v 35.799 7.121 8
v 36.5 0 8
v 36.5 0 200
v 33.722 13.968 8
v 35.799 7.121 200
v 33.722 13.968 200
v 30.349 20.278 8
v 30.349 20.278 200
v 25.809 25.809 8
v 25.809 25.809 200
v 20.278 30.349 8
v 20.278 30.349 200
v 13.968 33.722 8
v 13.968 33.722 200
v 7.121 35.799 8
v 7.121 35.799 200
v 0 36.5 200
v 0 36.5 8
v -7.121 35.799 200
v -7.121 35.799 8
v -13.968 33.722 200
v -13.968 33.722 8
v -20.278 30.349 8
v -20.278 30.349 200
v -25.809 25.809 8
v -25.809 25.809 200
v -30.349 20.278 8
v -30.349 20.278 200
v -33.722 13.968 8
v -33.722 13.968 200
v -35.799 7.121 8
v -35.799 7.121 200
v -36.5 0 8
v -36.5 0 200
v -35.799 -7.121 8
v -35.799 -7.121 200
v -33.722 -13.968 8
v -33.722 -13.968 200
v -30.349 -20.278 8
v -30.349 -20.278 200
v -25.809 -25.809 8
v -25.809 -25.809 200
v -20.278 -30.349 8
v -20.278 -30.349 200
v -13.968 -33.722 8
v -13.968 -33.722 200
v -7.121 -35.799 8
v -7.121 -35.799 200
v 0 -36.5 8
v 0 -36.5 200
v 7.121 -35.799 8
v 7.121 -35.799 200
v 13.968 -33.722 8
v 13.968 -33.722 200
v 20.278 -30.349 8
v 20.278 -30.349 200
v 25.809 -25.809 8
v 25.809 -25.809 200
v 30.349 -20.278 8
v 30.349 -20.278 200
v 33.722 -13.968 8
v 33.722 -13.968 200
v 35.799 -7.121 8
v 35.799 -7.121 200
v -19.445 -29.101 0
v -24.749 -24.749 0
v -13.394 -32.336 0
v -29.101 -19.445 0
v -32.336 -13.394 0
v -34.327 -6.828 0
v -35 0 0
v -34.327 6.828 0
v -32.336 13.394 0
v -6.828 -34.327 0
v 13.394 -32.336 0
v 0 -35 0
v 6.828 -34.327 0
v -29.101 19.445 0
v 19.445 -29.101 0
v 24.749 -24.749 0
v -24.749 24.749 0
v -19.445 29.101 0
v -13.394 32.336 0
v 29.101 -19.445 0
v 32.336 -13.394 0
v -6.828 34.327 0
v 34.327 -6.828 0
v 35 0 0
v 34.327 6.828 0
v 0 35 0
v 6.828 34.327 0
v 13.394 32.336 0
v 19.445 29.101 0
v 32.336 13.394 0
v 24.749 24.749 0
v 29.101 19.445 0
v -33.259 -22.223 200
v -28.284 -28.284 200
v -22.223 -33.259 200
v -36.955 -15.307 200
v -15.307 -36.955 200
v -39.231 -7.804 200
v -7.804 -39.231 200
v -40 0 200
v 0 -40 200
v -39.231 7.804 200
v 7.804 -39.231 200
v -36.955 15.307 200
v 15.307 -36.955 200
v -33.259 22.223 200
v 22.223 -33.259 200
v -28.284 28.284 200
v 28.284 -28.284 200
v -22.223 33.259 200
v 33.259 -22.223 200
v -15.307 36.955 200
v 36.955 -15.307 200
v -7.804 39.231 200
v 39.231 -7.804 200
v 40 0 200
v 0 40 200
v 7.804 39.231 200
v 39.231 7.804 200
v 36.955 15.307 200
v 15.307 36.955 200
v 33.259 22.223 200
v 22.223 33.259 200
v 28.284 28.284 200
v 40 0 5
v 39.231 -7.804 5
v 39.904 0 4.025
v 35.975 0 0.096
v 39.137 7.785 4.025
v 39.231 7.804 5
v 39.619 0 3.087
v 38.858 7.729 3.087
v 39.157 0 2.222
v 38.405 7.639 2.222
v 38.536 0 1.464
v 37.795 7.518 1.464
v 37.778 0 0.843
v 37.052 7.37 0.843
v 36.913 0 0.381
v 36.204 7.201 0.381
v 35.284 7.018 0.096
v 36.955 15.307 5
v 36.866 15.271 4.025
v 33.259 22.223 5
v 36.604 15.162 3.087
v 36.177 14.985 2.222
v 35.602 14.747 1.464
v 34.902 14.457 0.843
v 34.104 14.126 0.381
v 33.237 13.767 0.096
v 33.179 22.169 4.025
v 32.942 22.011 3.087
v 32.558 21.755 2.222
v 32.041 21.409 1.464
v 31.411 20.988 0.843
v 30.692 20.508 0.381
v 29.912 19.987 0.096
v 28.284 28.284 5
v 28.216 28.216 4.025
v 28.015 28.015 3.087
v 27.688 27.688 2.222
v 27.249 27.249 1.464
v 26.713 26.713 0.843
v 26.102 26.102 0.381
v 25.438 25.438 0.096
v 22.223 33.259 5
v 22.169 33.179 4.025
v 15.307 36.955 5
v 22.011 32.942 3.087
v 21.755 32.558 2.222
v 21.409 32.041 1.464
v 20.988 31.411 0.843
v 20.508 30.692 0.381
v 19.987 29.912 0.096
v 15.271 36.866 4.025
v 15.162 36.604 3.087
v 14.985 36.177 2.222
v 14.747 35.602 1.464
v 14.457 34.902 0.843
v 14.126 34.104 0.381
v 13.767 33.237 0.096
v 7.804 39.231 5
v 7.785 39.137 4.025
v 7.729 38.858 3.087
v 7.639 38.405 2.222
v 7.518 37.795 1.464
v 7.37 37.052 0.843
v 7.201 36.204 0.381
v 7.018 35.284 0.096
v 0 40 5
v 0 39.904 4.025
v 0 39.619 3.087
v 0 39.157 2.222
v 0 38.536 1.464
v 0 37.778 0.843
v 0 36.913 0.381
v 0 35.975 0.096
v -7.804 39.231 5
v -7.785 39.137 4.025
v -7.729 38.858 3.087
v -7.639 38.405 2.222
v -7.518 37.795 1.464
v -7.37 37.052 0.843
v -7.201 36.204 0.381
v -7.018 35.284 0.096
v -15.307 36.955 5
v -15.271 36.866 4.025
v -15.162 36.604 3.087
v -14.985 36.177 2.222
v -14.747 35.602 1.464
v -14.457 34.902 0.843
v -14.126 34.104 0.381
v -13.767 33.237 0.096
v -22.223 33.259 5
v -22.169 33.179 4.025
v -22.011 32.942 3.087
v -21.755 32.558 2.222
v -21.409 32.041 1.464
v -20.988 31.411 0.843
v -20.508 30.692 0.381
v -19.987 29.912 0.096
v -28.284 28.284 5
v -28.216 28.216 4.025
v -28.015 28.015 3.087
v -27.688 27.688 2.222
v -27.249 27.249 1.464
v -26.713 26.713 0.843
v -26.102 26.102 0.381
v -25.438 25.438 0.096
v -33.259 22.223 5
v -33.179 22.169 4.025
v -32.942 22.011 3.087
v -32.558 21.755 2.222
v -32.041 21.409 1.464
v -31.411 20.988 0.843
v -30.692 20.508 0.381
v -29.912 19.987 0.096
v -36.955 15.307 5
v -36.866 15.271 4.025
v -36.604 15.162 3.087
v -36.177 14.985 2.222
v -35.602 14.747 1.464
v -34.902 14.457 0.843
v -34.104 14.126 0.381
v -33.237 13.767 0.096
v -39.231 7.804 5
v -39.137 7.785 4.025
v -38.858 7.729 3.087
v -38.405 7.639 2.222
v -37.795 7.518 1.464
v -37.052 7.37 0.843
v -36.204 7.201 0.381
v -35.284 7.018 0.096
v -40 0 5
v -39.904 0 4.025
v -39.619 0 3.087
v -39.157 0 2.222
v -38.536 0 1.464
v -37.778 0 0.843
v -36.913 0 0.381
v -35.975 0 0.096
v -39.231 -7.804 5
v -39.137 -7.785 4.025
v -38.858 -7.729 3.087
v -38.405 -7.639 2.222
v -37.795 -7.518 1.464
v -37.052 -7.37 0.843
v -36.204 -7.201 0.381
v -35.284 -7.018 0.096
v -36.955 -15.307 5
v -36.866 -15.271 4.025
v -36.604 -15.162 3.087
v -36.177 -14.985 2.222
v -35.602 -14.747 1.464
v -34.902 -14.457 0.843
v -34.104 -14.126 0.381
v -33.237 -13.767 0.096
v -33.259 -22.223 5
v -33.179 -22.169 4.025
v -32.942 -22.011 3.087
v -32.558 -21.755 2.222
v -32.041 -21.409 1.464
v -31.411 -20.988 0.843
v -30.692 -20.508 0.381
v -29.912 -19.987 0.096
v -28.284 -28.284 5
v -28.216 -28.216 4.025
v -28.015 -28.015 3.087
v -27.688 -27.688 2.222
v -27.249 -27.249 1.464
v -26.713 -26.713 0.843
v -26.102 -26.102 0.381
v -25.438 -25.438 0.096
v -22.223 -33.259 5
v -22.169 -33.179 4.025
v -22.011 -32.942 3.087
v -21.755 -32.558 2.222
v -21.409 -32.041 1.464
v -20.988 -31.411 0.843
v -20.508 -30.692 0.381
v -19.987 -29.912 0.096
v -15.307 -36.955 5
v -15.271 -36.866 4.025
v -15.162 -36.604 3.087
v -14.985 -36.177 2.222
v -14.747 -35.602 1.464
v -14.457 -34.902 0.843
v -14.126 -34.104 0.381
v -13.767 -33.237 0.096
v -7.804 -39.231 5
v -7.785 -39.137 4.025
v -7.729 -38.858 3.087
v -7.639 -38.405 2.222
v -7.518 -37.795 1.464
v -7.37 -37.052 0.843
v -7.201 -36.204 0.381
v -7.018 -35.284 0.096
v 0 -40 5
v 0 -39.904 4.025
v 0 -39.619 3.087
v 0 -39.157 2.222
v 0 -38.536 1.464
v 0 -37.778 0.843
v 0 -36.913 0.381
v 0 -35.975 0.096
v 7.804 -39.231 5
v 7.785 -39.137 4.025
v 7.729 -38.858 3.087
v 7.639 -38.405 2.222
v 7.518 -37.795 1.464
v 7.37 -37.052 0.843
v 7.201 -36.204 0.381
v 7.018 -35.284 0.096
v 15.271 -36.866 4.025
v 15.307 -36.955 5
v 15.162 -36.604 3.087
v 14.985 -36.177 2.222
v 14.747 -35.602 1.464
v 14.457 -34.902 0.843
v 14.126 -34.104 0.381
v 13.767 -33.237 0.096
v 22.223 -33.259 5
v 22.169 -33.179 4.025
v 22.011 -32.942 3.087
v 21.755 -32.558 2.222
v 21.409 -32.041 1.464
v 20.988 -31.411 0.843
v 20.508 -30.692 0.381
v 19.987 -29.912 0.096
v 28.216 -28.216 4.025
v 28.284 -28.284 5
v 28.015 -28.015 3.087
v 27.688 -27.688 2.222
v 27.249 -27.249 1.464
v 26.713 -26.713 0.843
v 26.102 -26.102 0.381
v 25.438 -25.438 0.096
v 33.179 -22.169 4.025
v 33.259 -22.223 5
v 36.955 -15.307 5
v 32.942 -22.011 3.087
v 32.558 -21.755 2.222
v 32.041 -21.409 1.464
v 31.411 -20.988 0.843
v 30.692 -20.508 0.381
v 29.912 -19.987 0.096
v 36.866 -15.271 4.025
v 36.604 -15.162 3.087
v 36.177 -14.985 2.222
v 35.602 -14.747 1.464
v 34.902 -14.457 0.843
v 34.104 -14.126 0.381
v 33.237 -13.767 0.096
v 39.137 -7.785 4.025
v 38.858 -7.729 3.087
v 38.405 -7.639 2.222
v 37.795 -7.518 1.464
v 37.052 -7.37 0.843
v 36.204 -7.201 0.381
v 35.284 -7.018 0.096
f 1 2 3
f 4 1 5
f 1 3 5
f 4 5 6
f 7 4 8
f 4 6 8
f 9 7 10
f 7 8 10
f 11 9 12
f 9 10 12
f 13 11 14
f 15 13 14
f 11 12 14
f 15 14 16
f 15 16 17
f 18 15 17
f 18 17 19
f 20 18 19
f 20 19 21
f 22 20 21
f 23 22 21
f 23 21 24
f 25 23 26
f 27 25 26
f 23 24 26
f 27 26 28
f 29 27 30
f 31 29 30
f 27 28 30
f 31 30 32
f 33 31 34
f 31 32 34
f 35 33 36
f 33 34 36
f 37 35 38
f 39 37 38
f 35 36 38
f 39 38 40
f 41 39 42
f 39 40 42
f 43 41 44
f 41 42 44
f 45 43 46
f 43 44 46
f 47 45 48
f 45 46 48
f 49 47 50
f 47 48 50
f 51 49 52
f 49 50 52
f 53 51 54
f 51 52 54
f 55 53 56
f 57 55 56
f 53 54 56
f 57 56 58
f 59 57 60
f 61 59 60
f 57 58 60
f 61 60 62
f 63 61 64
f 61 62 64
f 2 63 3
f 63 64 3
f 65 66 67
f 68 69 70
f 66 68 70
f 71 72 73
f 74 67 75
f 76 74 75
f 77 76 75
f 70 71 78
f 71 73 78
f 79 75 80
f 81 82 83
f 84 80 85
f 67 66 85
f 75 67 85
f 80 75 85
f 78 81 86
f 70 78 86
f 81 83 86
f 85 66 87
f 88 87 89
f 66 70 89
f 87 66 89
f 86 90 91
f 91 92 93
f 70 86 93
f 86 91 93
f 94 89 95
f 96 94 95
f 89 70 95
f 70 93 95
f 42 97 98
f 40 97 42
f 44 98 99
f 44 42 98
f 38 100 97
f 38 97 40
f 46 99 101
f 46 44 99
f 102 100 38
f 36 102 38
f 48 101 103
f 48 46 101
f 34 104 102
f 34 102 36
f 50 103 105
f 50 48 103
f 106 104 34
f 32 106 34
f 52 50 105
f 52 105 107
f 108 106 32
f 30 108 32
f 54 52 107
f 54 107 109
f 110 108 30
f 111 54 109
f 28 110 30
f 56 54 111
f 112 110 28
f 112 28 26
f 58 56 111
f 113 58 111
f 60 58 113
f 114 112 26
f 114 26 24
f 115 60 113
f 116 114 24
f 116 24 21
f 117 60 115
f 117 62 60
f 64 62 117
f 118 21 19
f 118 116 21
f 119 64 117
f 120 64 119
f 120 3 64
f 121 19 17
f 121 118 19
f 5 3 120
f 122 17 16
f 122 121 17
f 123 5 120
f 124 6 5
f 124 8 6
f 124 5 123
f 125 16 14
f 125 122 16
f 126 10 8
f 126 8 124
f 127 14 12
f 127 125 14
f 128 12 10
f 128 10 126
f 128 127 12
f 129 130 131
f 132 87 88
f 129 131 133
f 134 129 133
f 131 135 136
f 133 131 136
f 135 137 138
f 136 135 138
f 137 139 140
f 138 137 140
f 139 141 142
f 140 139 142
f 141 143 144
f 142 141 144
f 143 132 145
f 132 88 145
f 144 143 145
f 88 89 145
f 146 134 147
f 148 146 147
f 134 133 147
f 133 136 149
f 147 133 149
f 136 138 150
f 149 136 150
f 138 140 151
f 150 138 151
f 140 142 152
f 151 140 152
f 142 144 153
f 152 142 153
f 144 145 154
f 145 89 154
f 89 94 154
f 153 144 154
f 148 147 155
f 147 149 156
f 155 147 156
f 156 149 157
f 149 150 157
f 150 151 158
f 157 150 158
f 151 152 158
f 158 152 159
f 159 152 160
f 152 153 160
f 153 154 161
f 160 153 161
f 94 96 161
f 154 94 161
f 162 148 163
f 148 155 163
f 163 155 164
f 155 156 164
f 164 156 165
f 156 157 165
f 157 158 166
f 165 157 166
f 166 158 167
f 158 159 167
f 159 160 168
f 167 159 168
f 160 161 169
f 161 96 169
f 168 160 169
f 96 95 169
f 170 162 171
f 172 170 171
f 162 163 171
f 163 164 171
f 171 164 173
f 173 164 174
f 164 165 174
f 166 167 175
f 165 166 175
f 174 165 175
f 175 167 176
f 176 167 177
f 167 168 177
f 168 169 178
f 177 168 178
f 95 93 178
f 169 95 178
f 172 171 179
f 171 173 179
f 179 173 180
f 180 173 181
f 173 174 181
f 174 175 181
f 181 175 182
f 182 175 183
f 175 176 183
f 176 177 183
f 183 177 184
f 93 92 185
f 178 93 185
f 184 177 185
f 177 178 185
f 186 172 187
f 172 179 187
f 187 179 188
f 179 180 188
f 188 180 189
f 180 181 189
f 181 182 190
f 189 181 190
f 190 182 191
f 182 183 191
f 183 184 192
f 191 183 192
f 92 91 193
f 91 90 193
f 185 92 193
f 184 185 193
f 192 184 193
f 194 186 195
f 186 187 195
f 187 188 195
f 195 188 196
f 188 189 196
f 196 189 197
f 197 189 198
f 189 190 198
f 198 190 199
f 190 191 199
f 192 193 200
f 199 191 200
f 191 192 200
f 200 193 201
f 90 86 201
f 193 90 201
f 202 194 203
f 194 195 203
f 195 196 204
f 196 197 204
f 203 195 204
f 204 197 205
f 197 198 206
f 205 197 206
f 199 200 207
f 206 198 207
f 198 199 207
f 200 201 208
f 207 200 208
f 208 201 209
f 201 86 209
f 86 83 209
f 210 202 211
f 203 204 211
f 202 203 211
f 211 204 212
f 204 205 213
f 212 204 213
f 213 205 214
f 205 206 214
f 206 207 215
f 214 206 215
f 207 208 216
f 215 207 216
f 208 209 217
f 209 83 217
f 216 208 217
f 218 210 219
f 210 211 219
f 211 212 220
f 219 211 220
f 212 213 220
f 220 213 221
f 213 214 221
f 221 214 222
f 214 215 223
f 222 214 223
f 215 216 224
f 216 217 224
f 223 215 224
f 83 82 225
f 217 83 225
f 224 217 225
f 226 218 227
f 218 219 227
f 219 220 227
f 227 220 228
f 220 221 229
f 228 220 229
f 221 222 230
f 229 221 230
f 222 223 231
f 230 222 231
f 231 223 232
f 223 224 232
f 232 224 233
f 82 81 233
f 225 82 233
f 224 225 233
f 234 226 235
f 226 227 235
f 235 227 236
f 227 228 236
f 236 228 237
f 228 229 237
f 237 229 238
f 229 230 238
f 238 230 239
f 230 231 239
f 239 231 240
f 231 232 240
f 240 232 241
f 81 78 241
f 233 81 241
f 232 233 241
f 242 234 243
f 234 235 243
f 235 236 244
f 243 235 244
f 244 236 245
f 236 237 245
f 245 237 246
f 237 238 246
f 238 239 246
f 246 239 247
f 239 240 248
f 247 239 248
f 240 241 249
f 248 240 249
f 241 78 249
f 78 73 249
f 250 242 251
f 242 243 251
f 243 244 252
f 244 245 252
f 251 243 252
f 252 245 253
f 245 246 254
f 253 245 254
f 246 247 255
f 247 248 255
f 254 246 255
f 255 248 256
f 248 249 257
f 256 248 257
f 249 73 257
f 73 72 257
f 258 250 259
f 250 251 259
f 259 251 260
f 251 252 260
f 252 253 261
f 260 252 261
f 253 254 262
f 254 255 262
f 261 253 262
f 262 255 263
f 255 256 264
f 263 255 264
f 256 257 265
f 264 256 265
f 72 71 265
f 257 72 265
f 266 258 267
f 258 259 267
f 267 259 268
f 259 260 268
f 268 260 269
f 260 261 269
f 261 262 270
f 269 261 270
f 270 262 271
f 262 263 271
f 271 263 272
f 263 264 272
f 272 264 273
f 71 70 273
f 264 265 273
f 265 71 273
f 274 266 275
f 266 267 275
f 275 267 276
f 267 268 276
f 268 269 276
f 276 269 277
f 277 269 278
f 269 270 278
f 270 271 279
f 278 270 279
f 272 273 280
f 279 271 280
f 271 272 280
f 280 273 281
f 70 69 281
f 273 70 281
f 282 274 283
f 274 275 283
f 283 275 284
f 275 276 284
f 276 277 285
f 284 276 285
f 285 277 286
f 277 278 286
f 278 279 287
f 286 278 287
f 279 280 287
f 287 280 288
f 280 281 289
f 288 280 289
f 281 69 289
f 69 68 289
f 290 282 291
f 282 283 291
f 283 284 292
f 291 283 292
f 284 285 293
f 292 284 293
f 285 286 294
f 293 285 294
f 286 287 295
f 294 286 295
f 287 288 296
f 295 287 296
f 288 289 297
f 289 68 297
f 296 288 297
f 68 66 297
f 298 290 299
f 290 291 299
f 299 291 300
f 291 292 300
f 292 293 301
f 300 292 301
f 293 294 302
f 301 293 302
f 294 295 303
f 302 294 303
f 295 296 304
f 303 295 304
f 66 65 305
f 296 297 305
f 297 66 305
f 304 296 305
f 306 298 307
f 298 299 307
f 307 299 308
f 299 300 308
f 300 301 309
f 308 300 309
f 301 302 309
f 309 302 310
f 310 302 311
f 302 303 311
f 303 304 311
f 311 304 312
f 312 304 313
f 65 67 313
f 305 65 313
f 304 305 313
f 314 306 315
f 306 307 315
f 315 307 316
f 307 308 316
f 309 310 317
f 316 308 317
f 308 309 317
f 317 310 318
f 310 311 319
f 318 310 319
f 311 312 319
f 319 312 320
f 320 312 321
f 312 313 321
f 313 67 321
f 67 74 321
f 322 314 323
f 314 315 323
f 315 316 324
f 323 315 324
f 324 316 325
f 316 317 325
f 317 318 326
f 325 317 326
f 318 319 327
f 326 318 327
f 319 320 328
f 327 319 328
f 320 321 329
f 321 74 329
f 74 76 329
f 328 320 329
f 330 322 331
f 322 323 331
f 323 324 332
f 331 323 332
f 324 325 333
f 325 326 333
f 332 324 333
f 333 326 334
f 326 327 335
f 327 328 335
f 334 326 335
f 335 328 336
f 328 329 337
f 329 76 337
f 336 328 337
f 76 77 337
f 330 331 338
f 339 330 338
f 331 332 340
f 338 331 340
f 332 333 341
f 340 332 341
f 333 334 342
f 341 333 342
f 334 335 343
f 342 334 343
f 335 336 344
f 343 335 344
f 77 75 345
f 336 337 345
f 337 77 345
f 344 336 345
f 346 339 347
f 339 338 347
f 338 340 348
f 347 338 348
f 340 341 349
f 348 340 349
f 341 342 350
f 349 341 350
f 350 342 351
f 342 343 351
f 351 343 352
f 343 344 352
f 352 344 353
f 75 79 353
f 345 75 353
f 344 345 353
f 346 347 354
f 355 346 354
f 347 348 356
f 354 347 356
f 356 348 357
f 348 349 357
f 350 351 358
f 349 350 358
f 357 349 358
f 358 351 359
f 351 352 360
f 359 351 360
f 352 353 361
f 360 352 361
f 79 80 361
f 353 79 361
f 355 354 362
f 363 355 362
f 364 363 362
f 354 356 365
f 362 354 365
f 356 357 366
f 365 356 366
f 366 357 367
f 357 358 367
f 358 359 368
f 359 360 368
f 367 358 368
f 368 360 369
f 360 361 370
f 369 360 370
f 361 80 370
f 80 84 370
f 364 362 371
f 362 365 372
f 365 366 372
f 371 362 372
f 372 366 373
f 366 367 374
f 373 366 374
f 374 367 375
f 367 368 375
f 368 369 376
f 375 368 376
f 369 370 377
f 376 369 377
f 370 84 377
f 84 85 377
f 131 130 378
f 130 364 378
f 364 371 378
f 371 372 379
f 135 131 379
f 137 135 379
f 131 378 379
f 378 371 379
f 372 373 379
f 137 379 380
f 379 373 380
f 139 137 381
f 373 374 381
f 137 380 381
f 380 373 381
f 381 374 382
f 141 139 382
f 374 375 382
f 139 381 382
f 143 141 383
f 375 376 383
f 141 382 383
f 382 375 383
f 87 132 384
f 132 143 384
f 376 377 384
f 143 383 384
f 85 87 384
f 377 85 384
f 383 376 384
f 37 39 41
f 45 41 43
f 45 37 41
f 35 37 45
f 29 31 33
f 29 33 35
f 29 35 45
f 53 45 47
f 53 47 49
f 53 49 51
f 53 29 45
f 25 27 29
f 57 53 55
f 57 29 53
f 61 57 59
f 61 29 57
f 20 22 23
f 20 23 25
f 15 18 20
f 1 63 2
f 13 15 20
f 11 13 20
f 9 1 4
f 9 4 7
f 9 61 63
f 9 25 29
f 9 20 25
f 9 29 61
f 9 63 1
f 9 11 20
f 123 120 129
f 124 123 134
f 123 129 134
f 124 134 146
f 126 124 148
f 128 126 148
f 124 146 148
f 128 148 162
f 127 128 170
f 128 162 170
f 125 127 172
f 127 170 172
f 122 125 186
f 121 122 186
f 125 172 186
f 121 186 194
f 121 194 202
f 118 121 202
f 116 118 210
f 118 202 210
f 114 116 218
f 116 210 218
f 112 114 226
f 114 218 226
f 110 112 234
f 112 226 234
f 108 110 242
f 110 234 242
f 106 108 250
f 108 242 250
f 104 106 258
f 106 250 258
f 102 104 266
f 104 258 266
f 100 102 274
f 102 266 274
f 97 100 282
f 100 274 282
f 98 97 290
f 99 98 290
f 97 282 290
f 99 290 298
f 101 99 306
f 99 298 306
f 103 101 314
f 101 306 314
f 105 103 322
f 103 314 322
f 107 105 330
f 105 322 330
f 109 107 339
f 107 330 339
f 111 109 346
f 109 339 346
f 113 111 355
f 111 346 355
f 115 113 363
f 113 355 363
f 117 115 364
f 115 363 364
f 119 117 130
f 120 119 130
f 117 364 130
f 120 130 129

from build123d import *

# Parameters (mm, degrees)
F0_R     = 40
F1_DEPTH = 200
F2_R     = 5
F3_R     = 36.5
F4_DEPTH = 192


with BuildPart() as f1:
    # F0 (on Top) → F1 (new body)
    with BuildSketch(Plane.XY):
        Circle(F0_R)
    extrude(amount=F1_DEPTH)

    # F2
    f2_edges = [f1.edges().sort_by_distance(p)[0] for p in [
        (-40, 0, 0),
    ]]
    fillet(f2_edges, radius=F2_R)

    # F3 (on face) → F4 (cut)
    with BuildSketch(Plane.XY.offset(200)):
        Circle(F3_R)
    extrude(amount=-F4_DEPTH, mode=Mode.SUBTRACT)


solid = f1.part
